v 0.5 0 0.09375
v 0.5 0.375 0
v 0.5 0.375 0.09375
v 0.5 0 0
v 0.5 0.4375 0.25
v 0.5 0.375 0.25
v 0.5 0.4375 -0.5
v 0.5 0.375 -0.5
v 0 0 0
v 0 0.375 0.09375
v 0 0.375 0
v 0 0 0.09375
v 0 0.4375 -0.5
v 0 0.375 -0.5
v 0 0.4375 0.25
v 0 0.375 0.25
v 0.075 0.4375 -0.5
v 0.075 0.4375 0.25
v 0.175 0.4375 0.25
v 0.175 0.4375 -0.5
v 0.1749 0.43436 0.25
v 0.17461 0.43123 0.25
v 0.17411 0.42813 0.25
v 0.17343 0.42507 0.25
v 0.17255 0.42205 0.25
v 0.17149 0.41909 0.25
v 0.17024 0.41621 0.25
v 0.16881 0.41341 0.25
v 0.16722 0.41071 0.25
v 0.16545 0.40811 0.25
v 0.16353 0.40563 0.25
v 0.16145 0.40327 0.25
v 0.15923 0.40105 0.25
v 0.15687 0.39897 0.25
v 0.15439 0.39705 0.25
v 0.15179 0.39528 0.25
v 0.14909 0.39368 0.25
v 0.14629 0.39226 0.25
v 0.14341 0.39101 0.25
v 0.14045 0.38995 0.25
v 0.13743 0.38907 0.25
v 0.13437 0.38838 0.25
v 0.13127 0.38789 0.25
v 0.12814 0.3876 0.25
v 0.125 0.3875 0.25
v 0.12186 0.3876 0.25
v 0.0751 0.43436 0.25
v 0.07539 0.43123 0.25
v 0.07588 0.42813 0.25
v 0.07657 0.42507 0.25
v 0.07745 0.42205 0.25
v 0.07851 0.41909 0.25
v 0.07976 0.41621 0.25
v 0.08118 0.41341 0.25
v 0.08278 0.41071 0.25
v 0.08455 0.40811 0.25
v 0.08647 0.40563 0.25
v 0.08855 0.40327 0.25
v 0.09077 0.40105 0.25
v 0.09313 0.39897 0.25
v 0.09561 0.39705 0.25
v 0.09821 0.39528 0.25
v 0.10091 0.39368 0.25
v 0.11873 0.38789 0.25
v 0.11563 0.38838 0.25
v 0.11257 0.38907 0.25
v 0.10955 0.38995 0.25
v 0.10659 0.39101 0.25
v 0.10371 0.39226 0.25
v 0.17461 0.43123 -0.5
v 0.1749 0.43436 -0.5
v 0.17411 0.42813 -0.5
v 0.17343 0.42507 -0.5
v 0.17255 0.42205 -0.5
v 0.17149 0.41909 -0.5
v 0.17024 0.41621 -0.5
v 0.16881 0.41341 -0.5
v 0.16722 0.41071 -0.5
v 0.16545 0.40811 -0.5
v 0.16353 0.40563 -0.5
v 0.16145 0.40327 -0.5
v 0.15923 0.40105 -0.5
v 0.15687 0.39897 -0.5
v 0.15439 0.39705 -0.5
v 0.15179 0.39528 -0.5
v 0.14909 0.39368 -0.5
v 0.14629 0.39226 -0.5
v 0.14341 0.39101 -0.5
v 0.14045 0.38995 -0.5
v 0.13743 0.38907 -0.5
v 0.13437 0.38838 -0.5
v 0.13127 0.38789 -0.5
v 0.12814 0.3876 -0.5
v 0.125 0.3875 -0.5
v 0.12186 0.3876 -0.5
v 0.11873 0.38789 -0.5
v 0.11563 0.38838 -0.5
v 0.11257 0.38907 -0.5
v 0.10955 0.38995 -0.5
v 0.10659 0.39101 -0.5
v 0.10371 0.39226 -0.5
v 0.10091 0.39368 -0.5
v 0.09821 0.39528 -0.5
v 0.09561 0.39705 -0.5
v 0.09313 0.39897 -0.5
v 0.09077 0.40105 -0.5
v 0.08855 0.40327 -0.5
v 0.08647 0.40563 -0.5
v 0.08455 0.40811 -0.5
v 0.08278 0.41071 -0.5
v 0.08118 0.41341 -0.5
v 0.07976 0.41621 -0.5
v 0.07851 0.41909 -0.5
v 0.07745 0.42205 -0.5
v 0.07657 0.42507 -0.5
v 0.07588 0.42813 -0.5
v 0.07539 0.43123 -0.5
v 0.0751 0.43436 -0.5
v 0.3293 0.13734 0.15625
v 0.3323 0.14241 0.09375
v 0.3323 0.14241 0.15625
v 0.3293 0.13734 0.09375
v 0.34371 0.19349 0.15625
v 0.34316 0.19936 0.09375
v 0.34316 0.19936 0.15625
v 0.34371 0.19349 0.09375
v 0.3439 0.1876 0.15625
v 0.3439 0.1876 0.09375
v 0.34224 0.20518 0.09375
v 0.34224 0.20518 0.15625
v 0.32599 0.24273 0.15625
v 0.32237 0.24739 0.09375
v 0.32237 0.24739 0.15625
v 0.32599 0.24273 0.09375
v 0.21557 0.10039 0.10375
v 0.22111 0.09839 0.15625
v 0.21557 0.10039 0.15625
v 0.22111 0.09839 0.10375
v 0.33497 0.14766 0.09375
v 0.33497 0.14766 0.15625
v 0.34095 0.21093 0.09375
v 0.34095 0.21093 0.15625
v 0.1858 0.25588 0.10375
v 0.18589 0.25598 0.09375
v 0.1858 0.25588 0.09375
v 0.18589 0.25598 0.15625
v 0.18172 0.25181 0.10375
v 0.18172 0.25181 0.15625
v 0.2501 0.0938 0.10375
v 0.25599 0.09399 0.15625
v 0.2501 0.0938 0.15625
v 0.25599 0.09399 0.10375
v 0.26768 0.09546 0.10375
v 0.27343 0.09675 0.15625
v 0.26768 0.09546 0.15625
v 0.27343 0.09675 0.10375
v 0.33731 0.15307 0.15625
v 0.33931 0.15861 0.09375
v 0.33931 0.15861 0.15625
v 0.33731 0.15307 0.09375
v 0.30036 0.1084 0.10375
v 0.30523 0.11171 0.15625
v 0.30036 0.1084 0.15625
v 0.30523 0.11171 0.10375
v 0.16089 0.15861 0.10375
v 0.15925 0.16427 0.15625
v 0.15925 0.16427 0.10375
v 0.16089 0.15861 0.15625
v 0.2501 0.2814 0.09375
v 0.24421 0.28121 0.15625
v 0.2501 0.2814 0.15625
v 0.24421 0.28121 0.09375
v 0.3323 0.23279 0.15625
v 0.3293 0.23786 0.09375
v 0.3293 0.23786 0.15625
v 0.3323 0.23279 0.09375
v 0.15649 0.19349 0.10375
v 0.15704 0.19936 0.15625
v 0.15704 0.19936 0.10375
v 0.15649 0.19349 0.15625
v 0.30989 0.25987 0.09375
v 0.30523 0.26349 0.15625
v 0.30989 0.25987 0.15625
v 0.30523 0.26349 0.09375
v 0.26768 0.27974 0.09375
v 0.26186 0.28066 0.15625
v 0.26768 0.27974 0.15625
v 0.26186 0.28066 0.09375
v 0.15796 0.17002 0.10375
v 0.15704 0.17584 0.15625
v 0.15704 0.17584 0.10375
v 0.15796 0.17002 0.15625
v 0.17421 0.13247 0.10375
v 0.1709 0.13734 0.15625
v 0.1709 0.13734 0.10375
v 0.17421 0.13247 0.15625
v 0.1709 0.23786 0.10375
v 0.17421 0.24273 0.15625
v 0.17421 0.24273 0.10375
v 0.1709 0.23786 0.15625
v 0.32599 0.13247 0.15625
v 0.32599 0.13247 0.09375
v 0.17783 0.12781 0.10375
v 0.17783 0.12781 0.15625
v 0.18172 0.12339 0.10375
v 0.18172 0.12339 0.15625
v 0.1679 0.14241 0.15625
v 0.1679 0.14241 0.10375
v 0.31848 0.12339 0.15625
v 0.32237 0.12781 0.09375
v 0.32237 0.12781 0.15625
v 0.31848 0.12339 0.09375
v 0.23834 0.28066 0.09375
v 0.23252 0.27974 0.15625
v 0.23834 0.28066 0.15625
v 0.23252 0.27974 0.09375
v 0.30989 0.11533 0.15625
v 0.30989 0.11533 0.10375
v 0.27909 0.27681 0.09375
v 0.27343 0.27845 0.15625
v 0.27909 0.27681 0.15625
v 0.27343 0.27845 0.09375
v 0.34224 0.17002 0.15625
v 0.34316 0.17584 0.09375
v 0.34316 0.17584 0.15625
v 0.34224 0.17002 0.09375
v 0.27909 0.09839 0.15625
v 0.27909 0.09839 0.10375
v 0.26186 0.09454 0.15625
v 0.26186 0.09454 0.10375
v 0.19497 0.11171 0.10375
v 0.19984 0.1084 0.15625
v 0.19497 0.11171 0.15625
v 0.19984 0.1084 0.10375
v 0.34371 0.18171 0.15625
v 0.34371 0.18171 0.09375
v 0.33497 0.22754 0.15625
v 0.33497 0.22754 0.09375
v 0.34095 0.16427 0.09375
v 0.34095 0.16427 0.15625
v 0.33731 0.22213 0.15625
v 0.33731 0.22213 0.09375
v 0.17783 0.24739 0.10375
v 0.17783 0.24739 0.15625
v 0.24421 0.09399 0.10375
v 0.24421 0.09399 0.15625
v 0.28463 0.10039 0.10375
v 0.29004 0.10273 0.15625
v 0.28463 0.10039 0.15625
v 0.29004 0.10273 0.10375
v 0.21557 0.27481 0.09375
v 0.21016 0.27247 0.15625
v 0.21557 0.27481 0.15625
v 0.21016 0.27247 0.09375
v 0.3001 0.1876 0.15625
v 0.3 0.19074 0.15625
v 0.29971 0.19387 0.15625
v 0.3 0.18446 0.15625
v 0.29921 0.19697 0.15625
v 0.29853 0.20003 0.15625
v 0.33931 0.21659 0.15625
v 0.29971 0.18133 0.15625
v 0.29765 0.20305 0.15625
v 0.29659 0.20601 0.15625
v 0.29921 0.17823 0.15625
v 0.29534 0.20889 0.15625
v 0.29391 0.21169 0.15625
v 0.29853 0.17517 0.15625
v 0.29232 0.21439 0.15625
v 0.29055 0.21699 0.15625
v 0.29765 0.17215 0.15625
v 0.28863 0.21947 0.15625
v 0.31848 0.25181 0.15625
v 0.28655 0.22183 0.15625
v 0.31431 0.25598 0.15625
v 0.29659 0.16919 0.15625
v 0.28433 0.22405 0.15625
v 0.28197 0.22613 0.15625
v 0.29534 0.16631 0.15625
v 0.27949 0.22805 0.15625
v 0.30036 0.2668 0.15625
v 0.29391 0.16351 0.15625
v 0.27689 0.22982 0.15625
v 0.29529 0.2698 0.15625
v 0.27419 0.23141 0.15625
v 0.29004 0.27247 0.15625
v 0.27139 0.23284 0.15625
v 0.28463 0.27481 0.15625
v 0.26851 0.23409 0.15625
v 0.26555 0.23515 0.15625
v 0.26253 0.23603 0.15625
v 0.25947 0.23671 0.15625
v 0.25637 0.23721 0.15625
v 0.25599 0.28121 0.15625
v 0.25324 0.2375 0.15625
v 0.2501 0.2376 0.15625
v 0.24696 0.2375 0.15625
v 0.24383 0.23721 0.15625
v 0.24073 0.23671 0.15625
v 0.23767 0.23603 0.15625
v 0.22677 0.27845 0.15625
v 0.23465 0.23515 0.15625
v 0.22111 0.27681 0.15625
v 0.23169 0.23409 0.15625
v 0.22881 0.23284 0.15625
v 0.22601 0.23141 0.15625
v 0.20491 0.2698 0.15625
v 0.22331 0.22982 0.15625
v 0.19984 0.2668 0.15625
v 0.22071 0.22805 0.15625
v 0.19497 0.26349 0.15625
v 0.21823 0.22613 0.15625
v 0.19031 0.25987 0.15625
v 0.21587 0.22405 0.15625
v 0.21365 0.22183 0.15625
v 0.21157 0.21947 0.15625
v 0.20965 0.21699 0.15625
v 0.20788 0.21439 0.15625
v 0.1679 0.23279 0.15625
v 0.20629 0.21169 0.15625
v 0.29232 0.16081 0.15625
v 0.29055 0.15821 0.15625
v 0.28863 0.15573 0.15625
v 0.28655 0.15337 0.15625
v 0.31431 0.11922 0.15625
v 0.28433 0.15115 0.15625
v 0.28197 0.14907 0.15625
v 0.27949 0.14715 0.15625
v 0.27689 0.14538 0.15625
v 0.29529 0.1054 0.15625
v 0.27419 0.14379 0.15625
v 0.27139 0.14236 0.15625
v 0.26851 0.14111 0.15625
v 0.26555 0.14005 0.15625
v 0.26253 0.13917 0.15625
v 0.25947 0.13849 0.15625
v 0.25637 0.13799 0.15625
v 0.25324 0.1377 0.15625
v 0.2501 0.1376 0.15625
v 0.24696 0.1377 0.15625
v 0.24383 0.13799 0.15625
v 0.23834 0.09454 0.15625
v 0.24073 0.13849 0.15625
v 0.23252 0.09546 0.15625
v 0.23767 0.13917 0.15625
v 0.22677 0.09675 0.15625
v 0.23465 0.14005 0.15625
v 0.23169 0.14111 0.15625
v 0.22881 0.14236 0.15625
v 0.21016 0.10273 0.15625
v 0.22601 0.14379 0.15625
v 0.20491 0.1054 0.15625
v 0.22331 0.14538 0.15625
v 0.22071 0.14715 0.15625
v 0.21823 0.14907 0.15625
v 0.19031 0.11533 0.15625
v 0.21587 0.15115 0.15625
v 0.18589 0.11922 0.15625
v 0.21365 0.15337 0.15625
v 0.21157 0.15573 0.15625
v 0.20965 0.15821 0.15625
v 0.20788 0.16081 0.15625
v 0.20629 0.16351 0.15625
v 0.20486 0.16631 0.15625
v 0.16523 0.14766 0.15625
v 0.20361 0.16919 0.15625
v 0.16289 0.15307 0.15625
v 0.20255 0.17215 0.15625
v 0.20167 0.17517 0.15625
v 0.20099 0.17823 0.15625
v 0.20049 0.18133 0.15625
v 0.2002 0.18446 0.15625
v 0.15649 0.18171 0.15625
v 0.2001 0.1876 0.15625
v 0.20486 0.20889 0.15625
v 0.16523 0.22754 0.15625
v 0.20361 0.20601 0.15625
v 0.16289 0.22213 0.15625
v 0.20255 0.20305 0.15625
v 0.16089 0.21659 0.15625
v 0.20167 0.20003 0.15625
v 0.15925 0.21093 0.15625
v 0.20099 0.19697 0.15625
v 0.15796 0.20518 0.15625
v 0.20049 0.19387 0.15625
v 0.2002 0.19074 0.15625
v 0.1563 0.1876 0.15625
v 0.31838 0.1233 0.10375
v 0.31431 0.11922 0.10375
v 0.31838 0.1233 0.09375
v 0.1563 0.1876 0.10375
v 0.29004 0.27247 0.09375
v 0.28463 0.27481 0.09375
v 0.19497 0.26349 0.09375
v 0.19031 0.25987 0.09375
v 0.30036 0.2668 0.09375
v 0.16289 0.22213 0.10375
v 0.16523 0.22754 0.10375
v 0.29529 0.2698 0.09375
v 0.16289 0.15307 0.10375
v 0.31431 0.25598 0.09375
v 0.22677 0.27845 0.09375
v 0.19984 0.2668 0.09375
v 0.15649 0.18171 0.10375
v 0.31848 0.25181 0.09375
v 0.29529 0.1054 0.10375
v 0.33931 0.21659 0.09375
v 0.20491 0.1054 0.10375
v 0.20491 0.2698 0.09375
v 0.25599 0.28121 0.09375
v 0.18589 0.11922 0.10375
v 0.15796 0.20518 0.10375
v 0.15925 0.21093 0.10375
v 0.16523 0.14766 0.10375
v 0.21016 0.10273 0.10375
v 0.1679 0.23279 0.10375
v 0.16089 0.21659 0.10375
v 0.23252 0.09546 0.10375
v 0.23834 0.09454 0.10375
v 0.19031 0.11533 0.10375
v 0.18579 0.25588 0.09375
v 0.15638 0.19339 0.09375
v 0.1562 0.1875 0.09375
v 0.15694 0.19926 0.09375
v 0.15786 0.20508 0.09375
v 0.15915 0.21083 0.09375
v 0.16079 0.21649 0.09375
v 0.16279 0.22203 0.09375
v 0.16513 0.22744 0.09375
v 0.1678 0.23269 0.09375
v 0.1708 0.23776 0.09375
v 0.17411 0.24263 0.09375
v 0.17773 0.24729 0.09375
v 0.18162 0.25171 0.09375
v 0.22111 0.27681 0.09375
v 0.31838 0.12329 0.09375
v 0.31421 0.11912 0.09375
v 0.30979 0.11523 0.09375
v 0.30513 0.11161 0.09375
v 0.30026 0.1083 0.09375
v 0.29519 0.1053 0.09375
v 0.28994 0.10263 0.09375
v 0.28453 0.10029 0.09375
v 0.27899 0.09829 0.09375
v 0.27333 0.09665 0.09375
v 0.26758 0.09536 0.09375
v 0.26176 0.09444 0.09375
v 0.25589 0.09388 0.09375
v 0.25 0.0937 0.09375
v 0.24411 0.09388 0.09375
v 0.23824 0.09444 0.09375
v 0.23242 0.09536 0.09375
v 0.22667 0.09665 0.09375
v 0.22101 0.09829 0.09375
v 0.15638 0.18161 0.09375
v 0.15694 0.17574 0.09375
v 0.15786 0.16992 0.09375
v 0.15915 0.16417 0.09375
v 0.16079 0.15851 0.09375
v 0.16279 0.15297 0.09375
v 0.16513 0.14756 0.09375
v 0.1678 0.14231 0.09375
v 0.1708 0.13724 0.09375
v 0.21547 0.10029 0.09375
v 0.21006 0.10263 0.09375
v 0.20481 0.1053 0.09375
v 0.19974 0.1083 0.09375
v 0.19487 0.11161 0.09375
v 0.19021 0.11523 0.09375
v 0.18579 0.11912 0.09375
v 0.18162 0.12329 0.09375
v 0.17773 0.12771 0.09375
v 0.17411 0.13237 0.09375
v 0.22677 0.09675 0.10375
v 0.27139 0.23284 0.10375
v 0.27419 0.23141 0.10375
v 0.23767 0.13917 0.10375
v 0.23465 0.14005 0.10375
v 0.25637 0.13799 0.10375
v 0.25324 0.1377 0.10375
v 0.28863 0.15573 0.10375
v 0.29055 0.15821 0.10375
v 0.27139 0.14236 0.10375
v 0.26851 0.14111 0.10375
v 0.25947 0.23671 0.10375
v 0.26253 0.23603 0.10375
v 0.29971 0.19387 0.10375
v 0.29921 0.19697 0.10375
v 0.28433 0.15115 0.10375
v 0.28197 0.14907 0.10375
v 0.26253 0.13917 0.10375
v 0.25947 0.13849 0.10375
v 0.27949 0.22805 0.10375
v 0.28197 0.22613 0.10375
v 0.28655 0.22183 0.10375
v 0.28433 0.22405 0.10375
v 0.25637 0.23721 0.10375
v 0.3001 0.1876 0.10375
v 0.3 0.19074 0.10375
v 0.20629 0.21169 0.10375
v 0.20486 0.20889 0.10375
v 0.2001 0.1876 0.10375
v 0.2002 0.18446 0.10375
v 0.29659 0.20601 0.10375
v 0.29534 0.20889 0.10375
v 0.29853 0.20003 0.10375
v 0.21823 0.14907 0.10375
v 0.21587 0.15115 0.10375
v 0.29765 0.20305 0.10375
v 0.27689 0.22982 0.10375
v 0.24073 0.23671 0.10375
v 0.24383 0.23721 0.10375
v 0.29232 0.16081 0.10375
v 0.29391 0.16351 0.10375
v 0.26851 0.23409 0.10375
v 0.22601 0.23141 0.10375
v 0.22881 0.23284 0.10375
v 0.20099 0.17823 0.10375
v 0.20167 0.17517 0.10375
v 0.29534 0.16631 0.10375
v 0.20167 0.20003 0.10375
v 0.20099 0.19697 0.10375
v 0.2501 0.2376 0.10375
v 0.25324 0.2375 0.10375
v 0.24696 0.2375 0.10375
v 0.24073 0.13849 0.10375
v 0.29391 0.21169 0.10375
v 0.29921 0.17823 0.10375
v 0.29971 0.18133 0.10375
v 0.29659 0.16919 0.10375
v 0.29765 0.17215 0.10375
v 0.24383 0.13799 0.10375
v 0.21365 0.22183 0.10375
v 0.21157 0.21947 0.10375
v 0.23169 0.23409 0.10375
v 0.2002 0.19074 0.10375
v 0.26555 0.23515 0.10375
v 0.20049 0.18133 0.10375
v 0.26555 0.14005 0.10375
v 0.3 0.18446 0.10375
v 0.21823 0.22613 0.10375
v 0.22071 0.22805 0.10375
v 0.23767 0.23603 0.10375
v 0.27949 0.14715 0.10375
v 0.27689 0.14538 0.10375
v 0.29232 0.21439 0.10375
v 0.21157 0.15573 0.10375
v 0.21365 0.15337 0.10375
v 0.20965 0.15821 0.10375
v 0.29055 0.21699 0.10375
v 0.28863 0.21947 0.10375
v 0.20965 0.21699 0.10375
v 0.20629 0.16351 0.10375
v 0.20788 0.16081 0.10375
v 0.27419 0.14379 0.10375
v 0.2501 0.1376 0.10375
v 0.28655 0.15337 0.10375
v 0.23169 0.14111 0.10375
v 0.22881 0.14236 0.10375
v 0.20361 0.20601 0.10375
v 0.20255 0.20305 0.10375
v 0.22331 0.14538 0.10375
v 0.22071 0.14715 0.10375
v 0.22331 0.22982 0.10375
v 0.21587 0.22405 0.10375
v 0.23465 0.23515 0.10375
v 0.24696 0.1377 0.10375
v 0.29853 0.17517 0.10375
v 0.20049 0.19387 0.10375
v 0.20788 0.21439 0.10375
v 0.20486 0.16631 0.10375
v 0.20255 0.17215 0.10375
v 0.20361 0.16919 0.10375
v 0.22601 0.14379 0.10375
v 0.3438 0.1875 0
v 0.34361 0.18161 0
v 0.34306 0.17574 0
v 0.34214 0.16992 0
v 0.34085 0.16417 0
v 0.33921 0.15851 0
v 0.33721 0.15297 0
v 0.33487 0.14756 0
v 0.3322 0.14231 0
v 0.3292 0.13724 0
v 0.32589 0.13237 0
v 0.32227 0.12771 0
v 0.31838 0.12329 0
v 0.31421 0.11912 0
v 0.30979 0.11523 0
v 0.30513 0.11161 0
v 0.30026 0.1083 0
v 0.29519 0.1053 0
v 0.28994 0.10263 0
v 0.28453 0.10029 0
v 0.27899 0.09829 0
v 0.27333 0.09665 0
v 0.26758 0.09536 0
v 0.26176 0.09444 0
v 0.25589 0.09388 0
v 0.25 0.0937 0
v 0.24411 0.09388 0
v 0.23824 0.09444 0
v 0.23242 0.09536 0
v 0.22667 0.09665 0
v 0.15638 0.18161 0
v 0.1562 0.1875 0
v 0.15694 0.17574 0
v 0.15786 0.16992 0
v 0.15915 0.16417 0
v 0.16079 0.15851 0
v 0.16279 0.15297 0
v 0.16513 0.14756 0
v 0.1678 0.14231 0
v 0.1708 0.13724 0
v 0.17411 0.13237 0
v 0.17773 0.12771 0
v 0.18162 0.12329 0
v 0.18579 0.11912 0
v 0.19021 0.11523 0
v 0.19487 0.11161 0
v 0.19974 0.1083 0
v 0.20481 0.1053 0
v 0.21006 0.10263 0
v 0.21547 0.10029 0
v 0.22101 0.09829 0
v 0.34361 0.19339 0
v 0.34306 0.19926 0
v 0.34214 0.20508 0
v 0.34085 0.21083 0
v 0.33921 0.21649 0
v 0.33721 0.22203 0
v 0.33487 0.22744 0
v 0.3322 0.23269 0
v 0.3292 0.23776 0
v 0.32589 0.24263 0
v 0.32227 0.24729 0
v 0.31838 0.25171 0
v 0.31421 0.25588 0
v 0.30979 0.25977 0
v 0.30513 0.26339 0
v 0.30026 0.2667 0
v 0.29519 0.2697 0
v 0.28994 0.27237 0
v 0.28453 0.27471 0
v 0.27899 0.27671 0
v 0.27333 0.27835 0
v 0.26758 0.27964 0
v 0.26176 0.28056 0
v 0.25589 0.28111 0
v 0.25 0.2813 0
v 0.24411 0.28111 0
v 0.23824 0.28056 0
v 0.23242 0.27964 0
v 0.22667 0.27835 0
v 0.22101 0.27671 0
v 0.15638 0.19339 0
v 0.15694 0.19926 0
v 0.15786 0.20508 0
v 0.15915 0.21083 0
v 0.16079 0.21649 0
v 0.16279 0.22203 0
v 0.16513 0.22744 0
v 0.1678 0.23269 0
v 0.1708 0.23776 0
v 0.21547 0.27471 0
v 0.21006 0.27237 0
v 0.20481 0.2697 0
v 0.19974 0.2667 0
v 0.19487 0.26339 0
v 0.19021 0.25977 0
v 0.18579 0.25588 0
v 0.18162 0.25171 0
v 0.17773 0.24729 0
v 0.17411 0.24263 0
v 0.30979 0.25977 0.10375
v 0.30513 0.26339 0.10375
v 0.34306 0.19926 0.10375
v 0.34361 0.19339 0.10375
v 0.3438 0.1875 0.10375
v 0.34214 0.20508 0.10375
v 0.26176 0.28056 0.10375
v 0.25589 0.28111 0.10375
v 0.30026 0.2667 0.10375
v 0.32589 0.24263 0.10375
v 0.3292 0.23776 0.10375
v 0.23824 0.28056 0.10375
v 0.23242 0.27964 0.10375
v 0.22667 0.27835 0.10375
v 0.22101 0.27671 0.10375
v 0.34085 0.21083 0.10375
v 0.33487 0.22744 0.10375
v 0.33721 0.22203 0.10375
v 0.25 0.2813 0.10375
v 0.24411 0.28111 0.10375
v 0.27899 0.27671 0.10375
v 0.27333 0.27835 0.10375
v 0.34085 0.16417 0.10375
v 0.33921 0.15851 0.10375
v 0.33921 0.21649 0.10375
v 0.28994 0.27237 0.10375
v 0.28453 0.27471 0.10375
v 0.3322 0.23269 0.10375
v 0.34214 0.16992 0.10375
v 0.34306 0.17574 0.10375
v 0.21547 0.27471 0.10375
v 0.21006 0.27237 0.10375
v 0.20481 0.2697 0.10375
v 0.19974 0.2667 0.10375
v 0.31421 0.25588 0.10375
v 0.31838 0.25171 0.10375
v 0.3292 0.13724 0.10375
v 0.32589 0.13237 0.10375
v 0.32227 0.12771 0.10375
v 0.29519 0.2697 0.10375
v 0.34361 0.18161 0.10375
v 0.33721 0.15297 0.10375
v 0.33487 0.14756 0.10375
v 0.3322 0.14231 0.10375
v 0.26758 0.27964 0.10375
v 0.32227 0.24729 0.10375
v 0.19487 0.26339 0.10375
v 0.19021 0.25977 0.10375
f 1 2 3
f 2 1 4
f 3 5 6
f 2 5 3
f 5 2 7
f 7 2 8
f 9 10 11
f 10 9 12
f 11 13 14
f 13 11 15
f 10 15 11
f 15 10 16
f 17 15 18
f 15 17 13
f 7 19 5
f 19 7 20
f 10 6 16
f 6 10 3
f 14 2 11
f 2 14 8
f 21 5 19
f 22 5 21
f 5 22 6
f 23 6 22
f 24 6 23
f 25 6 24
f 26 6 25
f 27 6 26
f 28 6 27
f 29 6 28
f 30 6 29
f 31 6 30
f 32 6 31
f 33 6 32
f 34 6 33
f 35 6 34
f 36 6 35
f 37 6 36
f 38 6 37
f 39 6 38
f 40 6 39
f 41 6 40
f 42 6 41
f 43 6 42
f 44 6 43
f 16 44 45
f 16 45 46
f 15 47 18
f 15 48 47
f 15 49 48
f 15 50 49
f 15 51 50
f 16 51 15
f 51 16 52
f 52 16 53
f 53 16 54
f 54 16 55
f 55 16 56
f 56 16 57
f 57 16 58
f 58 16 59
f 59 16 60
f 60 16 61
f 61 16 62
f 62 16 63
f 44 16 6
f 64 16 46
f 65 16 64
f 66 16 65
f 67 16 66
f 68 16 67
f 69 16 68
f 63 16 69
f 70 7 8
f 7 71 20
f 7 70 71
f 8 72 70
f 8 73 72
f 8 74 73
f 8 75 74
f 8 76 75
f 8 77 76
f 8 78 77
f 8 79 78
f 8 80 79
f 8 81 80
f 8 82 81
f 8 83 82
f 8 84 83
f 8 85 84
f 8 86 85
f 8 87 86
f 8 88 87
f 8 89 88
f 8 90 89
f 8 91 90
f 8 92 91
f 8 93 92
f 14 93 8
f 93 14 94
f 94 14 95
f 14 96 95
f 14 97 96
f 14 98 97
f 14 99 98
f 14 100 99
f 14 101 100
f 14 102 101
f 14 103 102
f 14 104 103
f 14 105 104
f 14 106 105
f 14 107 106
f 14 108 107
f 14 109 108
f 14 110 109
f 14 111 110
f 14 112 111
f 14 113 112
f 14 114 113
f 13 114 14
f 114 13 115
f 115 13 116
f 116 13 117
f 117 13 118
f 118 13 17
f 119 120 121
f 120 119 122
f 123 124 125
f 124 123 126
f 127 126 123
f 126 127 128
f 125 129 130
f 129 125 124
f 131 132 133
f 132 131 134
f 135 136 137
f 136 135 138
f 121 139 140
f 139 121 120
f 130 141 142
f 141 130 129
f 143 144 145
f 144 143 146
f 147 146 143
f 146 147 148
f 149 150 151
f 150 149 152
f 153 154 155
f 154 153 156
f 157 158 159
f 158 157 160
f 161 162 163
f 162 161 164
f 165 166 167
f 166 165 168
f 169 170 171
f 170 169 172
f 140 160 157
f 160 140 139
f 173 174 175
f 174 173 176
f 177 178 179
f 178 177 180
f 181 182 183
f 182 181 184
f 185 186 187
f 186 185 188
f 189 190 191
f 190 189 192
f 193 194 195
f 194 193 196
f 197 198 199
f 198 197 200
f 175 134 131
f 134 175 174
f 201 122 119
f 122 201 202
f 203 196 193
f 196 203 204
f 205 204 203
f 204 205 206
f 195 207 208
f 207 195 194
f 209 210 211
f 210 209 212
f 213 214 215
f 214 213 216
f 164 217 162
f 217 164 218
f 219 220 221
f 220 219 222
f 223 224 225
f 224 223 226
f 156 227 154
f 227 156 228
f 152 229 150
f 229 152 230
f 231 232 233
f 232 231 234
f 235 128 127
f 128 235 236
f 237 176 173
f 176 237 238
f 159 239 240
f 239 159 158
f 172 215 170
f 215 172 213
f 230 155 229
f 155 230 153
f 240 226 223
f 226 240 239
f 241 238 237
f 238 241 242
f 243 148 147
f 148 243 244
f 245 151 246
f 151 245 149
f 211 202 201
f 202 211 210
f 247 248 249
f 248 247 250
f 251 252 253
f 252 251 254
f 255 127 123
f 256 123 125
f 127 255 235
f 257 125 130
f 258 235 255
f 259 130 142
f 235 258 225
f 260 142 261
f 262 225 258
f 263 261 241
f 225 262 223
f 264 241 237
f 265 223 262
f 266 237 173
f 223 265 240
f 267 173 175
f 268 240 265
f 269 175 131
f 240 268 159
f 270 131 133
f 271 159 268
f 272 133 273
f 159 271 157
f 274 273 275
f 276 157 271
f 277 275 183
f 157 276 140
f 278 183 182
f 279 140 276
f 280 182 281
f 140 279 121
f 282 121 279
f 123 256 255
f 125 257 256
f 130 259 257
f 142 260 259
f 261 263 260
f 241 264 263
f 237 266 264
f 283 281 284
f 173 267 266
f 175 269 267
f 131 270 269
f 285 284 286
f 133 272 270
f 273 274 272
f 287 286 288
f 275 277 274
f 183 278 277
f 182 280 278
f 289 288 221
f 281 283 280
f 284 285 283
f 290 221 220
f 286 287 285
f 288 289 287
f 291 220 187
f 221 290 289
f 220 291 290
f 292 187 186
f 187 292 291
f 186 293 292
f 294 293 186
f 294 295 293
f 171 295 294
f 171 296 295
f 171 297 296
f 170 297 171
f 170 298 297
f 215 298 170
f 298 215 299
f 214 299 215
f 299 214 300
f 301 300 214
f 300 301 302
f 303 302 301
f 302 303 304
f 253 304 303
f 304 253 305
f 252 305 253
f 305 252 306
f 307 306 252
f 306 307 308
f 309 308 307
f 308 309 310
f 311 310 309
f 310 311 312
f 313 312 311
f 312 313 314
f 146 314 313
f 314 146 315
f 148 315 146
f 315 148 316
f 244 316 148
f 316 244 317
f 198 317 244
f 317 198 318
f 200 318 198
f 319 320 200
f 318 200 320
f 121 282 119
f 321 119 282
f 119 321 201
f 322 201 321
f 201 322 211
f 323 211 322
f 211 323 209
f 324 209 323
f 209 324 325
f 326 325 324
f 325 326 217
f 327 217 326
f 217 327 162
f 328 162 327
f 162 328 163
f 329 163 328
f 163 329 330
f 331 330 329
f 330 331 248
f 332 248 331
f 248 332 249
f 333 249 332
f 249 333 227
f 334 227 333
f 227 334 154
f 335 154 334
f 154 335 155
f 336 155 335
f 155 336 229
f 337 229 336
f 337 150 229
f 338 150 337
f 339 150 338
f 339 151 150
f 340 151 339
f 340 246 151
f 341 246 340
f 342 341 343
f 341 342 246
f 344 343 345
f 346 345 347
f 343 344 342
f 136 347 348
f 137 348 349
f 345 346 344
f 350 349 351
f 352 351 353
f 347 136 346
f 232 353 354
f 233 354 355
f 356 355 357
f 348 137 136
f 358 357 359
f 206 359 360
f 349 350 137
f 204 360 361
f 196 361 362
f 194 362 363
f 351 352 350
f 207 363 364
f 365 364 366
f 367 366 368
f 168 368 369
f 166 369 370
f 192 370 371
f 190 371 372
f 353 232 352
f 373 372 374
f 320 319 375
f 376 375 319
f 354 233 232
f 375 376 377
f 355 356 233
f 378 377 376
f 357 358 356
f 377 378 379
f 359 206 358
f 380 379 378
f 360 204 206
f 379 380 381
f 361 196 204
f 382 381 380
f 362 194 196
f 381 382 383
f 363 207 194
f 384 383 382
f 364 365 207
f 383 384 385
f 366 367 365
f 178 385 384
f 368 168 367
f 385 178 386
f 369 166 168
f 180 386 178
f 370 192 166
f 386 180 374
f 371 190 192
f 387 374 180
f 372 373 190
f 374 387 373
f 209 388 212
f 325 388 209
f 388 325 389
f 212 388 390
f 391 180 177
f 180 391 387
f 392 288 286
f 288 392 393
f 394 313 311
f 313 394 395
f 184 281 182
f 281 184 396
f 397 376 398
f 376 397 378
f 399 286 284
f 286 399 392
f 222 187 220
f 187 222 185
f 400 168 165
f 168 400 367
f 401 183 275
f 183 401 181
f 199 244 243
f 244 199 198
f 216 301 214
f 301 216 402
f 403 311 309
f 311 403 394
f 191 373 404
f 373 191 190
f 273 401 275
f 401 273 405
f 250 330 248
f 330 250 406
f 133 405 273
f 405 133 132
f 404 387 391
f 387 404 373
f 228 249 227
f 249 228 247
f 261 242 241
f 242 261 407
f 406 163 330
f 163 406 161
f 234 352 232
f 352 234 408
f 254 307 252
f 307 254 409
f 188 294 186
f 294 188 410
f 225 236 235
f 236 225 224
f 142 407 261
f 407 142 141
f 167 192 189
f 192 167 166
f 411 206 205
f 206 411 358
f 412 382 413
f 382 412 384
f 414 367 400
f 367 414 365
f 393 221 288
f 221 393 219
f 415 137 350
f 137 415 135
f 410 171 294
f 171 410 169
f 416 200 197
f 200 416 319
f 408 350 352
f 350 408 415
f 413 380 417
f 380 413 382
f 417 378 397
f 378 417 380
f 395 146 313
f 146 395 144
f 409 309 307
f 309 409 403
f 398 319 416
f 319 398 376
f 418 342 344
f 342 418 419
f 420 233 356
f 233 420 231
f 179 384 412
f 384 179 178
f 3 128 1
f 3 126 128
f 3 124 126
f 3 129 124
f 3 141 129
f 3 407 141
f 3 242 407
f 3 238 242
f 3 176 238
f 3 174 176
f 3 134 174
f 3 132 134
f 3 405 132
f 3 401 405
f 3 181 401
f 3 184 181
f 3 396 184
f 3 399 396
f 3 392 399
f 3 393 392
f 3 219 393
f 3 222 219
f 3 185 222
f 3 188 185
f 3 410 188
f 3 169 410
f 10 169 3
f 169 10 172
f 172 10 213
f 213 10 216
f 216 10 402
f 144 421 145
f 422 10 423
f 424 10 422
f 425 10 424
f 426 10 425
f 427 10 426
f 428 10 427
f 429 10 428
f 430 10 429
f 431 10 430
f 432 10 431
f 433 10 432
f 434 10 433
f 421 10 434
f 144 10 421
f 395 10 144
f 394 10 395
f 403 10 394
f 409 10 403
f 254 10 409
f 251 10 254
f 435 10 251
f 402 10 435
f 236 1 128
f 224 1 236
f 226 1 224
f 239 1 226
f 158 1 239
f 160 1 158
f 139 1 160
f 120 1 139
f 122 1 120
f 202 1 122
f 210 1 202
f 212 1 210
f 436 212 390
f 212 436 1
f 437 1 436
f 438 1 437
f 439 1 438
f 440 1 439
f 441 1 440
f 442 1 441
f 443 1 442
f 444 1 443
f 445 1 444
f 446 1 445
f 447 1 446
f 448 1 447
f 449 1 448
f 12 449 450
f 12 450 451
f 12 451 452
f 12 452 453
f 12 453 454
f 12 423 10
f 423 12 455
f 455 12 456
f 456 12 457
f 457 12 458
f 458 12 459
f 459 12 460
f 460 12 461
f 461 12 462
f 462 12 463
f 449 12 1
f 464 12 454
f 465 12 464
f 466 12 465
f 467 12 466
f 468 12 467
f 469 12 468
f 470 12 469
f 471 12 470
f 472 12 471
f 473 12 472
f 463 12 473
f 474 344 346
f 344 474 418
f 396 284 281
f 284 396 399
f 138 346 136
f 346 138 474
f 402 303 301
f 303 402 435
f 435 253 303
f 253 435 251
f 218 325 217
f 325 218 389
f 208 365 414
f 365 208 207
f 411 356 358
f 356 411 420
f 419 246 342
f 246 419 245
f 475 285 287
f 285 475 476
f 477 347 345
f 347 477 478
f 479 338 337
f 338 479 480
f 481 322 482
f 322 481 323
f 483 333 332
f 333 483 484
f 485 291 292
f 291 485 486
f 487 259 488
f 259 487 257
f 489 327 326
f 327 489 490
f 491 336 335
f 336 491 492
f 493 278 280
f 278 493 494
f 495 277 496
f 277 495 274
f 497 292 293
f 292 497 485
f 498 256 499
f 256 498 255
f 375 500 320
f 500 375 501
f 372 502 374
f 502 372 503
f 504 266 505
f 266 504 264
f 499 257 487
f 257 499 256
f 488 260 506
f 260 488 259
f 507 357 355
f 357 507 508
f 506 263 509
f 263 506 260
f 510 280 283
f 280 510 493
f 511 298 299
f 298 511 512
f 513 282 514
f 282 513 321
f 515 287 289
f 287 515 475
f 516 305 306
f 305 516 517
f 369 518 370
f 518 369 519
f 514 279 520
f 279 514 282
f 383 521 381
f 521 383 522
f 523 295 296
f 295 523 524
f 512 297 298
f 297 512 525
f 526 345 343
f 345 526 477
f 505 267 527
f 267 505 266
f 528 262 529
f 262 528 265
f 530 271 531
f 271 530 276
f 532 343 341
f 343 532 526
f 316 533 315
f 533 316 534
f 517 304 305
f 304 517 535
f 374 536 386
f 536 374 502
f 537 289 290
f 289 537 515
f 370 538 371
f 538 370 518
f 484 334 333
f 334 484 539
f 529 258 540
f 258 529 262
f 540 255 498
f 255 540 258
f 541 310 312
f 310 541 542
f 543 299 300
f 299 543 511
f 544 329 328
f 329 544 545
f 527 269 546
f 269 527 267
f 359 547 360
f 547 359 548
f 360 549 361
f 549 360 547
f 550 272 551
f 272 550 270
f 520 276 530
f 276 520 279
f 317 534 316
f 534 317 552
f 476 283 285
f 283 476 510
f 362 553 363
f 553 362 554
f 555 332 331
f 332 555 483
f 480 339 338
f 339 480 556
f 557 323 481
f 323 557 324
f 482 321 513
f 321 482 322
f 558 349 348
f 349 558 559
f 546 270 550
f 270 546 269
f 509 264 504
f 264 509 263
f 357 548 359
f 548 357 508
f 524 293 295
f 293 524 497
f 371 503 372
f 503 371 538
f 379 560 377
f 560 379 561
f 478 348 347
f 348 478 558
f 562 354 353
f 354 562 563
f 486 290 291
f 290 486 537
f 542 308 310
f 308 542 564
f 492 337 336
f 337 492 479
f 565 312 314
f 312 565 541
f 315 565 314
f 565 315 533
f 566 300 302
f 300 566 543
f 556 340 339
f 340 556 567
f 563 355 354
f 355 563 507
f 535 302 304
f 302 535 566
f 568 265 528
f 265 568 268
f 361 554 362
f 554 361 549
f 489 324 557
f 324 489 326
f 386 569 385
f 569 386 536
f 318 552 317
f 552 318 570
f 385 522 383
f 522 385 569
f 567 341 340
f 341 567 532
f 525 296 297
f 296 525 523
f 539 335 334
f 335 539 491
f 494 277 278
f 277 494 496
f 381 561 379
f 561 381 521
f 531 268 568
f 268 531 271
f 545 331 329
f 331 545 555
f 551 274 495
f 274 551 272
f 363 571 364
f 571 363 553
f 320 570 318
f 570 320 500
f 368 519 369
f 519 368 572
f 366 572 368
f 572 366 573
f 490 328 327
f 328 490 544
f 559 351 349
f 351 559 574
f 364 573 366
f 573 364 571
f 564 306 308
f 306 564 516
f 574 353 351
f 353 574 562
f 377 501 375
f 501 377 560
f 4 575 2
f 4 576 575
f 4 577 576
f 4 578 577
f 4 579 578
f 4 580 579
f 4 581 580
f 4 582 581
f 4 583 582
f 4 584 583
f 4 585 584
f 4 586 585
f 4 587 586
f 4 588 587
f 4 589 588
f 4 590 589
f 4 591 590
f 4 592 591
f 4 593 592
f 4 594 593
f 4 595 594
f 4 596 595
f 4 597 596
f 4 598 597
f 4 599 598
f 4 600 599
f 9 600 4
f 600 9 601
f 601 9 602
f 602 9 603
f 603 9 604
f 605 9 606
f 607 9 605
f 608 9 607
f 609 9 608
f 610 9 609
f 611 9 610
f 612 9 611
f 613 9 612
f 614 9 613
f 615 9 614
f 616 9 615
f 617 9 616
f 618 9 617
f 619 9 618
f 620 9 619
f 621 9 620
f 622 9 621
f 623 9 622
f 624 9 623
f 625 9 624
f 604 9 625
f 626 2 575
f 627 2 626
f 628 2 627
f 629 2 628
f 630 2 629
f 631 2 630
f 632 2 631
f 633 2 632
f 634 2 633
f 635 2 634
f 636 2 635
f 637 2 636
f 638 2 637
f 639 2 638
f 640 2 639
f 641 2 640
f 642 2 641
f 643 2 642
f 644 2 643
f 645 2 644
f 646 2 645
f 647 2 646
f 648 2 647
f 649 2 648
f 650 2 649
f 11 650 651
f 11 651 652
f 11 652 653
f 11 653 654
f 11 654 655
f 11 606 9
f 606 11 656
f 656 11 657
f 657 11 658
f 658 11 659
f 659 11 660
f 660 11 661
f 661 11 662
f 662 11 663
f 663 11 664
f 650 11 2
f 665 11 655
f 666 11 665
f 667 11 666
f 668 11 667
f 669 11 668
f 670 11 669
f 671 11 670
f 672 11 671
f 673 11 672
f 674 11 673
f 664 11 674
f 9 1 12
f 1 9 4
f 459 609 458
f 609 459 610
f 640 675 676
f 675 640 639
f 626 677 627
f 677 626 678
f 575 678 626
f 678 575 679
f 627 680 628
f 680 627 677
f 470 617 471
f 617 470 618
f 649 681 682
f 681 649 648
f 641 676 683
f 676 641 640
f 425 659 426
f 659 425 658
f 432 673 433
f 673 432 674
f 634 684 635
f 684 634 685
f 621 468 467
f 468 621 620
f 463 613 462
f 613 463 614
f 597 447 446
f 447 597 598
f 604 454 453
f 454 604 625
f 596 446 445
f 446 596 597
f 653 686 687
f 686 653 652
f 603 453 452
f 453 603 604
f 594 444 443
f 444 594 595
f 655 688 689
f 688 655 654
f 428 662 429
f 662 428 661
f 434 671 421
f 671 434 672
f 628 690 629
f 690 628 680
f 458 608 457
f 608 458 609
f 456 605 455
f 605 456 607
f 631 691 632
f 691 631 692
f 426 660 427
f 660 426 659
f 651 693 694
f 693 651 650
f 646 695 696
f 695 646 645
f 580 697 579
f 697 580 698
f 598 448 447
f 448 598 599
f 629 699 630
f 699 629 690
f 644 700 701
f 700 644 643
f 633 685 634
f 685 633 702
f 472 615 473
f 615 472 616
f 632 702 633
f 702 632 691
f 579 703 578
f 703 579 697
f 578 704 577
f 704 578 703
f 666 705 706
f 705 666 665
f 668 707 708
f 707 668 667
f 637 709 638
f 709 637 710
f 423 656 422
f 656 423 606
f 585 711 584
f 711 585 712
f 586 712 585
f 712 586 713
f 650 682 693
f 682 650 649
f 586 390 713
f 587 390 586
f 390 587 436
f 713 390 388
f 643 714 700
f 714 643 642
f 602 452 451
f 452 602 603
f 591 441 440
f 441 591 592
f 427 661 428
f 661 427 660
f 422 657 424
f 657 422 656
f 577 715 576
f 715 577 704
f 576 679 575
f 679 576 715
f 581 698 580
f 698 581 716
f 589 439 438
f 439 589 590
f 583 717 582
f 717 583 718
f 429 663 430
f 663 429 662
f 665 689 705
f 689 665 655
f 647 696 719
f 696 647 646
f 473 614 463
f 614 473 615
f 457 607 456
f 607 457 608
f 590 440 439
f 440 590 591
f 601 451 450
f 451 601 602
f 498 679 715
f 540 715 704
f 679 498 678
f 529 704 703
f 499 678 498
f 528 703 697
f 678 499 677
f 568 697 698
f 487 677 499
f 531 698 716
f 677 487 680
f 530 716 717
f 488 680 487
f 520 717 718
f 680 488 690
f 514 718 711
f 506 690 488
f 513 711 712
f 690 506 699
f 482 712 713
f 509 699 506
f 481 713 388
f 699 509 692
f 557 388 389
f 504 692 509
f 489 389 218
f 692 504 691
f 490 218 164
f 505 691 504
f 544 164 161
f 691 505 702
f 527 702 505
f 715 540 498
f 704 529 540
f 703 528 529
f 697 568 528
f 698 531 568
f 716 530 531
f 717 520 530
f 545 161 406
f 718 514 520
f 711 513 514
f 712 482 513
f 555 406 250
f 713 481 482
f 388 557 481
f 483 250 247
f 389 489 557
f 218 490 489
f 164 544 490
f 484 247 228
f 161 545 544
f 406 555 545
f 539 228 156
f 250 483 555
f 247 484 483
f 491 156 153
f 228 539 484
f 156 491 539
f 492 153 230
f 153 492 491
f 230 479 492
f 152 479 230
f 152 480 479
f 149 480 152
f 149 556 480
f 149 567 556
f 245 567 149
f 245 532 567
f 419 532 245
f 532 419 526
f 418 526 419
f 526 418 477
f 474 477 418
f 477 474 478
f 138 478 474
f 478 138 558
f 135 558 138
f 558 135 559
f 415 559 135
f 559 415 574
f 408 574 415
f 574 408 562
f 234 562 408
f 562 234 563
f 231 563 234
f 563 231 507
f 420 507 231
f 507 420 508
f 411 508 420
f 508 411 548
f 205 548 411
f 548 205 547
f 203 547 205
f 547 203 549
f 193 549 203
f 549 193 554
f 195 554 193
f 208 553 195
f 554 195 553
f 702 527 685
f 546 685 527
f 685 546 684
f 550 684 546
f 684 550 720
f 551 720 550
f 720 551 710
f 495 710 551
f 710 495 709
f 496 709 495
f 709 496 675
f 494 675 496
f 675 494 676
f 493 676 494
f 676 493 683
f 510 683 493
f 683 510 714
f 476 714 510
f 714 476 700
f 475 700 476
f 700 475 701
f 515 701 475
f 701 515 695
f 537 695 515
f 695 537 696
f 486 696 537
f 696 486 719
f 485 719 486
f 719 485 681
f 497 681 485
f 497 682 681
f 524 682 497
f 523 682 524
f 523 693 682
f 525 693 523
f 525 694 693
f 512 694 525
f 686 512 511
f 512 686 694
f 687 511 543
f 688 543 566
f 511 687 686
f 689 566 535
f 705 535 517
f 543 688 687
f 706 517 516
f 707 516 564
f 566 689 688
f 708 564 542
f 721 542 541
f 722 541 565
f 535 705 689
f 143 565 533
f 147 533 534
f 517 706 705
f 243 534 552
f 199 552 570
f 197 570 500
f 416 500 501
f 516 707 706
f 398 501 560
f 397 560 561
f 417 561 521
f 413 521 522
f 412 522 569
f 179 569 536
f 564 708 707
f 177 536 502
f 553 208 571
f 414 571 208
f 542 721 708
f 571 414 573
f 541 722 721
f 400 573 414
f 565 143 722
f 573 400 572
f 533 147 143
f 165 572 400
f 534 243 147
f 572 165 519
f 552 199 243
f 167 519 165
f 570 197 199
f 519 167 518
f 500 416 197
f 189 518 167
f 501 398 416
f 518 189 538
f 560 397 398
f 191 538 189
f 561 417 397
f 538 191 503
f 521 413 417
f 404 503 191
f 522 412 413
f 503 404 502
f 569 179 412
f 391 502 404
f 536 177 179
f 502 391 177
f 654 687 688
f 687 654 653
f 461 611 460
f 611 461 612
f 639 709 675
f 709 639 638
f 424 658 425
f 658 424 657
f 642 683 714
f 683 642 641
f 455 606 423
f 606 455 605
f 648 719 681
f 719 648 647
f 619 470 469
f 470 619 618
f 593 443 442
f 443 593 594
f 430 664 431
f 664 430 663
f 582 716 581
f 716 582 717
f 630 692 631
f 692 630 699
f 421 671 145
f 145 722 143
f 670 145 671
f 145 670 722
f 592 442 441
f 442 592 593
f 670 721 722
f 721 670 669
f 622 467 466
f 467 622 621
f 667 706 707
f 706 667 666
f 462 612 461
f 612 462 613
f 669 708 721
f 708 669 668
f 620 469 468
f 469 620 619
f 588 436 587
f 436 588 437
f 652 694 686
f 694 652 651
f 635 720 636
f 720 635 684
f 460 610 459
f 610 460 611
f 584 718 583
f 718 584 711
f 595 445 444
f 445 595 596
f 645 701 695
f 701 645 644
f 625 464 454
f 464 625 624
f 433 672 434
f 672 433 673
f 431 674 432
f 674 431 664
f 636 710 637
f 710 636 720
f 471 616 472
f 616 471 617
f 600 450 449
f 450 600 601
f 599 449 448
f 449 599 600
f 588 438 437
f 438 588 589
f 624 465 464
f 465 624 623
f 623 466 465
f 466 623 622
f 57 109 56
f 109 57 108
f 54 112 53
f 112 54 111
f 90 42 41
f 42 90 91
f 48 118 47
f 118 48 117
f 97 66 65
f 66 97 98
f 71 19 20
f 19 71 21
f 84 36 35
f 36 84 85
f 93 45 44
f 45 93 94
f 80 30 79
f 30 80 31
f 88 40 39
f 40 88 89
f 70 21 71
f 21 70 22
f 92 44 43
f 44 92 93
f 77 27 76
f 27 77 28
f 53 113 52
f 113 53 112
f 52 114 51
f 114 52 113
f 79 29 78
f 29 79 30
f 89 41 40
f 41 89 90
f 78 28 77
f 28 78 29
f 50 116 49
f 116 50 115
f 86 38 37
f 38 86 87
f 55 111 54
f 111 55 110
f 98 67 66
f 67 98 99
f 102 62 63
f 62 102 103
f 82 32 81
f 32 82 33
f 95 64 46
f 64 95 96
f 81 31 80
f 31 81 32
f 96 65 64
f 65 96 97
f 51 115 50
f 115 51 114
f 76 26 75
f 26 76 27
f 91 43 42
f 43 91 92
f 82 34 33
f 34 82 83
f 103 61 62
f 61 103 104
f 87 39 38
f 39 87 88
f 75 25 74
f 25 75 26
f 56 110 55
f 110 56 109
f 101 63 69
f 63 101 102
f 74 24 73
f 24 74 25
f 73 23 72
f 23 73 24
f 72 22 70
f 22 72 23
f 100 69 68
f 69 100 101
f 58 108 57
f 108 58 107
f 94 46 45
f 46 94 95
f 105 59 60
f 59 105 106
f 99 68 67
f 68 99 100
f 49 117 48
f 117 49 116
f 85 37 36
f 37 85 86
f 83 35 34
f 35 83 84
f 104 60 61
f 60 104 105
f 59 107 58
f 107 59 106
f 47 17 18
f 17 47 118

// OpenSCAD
$fn = 100;

// Parameters
base_len = 0.5;
base_wid = 0.4375;
base_ht  = 0.09375;

base_void_x = 0.25;
base_void_y = 0.1875;
base_void_r = 0.0938;

strip_len = 0.5;
strip_wid = 0.0625;
strip_y   = base_wid - strip_wid;

strip1_z_min = -0.25;
strip1_z_max = 0.0;

strip2_z_min = -0.5;
strip2_z_max = 0.25;

strip2_void_x = 0.125;
strip2_void_y = 0.4375;
strip2_void_r = 0.05;

collar_x = 0.2501;
collar_y = 0.1876;
collar_r_out = 0.0938;
collar_r_in  = 0.05;
collar_h     = 0.0625;
collar_z     = base_ht;

// Modules
module base_solid() {
    cube([base_len, base_wid, base_ht]);
}

module back_strips() {
    translate([0, strip_y, strip1_z_min])
        cube([strip_len, strip_wid, strip1_z_max - strip1_z_min]);
    translate([0, strip_y, strip2_z_min])
        cube([strip_len, strip_wid, strip2_z_max - strip2_z_min]);
}

module collar_solid() {
    translate([collar_x, collar_y, collar_z])
        difference() {
            cylinder(h=collar_h, r=collar_r_out);
            translate([0, 0, -0.01])
                cylinder(h=collar_h + 0.02, r=collar_r_in);
        }
}

module all_voids() {
    translate([base_void_x, base_void_y, -0.01])
        cylinder(h=base_ht + 0.02, r=base_void_r);
    translate([strip2_void_x, strip2_void_y, strip2_z_min - 0.01])
        cylinder(h=strip2_z_max - strip2_z_min + 0.02, r=strip2_void_r);
}

// Assembly
difference() {
    union() {
        base_solid();
        back_strips();
        collar_solid();
    }
    all_voids();
}
